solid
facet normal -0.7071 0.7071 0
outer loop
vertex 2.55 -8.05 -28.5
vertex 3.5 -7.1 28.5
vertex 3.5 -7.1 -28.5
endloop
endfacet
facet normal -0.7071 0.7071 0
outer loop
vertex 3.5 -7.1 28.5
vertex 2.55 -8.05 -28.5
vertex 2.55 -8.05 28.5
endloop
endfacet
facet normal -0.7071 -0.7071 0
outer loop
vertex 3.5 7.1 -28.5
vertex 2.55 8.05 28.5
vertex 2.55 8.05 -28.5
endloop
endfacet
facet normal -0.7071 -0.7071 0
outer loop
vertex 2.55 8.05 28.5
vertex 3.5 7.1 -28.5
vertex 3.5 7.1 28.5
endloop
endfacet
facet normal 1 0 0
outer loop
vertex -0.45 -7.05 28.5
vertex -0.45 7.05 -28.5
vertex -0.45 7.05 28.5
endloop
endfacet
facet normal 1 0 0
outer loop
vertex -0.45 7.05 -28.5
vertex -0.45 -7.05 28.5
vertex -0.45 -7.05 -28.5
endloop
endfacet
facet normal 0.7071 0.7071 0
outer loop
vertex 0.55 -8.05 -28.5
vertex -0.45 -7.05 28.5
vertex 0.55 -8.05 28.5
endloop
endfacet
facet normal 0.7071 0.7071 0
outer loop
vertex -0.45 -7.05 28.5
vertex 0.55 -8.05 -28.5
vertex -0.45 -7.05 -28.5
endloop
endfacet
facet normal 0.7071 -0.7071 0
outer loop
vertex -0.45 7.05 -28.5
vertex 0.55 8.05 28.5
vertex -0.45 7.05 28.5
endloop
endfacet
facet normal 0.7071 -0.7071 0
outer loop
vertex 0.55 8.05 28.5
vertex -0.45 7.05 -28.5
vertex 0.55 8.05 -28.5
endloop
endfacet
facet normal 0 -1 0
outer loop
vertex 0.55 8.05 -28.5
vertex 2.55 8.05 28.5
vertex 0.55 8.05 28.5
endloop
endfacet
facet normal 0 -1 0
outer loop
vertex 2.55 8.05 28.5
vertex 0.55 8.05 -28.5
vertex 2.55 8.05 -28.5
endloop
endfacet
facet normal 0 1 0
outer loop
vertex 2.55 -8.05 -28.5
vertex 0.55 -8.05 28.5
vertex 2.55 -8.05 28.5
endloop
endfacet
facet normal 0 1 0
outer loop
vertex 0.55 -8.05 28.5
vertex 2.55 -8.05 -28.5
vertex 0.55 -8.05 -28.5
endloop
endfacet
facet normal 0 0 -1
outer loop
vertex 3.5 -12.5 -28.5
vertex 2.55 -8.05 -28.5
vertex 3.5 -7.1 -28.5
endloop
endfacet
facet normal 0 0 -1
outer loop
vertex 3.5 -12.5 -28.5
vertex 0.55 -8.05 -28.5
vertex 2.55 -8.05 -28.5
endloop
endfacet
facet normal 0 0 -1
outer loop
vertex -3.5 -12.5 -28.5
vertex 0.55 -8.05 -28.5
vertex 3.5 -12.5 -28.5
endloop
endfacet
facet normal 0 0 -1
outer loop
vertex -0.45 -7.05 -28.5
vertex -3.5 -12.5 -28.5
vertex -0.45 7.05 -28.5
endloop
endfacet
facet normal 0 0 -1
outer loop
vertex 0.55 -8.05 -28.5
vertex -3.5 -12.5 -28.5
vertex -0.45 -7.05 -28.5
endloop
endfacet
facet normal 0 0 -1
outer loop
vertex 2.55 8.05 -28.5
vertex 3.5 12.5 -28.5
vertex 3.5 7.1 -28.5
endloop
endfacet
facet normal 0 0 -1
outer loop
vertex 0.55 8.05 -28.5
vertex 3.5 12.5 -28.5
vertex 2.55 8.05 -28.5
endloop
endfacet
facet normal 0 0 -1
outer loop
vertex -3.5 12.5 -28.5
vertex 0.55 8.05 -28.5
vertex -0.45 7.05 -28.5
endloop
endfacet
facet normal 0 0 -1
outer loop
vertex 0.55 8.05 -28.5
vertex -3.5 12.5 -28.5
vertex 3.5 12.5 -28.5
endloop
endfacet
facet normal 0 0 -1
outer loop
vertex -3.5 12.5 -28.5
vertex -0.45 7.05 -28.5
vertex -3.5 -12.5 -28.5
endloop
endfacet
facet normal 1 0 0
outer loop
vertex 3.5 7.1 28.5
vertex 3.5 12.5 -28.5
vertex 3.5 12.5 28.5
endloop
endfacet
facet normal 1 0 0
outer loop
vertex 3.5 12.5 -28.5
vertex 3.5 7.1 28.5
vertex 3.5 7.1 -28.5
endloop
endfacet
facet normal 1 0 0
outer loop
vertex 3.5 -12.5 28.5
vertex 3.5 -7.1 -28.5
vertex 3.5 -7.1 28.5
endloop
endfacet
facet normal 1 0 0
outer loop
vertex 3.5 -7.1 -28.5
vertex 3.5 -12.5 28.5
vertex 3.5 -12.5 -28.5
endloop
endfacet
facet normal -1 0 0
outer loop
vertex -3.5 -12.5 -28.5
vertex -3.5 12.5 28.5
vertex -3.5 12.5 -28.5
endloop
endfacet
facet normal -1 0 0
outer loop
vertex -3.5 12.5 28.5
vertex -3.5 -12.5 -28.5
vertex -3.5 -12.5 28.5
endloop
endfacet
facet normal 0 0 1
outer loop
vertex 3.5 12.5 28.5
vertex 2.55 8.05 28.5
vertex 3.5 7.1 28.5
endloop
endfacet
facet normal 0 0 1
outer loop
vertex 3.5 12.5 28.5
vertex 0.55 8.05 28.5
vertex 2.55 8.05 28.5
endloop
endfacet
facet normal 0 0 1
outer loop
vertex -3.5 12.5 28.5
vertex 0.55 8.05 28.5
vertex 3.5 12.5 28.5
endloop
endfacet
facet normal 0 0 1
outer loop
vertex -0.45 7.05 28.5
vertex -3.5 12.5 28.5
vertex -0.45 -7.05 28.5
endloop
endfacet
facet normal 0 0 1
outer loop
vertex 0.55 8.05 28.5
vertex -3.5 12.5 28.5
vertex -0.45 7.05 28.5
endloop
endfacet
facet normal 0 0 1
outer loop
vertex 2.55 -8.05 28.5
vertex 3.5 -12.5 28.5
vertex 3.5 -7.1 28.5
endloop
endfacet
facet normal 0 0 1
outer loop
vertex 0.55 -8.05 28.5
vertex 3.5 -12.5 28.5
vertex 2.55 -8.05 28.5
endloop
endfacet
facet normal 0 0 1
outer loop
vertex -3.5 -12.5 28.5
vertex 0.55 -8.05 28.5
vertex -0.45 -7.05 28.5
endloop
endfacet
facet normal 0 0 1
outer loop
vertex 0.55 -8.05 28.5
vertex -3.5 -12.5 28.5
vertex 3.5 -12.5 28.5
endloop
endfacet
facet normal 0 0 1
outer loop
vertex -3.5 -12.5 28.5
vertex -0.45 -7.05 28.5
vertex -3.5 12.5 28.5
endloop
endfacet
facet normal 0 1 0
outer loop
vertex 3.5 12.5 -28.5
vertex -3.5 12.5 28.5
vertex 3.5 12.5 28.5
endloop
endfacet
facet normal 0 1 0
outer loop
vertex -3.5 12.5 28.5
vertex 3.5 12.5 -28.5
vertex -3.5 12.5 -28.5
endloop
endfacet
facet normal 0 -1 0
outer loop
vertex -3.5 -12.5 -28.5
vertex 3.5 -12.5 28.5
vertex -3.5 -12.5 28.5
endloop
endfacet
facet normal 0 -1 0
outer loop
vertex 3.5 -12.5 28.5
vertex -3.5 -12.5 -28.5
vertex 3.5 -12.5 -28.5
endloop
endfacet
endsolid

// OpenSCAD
//
// DRO caliper pcb mount. Holds pcb onto scale
//

ox = 57;
oy = 25;
oz = 7;

sloty = 16.1;
slotz = 4;

module pre()
{
cube([ox, oy, oz], center=true);
}

chamy = 1;
chamz = 1;

module prism(xrot)
{
    rotate([xrot, 0, 0])
    {
        difference()
        {
        cube([ox+0.1, chamy, chamz], center=true);
        translate([0, chamy/2, -chamz/2])
            {
            rotate([45, 0, 0])
                {
                remcham = sqrt(chamy*chamy + chamz*chamz);
                cube([ox+0.1, remcham, remcham], center=true);        
                }
            }
        }
    }
}

module scale_profile()
{
    difference()
    {
    cube([ox+0.1, sloty, slotz], center=true);
    translate([0, -sloty/2+chamy/2, slotz/2-chamz/2])
        {
        prism(0);
        }
 
    translate([0, sloty/2-chamy/2, slotz/2-chamz/2])
        {
        prism(270);
        }
 
    translate([0, -sloty/2+chamy/2, -slotz/2+chamz/2])
        {
        prism(90);
        }
 
    translate([0, sloty/2-chamy/2, -slotz/2+chamz/2])
        {
        prism(180);
        }
 
    }
}


module rem()
{
translate([0,0, oz/2-slotz/2+0.05])
    {
        scale_profile();
    }
}


module mount()
{
difference()
    {
    pre();
    rem();
    }
    
}

rotate([0,90,0])
mount();
